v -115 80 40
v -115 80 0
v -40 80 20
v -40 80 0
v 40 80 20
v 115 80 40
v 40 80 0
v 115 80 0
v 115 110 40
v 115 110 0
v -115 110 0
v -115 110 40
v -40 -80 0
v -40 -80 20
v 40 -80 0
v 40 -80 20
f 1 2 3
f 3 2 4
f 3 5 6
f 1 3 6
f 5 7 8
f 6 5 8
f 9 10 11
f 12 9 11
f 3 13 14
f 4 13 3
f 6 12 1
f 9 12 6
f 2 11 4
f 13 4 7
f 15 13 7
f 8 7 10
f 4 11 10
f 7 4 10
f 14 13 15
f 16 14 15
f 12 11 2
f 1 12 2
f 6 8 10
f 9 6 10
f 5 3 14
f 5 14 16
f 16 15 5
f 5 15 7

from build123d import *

# Parameters (mm, degrees)
SKETCH1_W           = 80
SKETCH1_H           = 160
BOSS_EXTRUDE1_DEPTH = 20
BOSS_EXTRUDE2_DEPTH = 40


with BuildPart() as part:
    # Sketch1 → Boss-Extrude1 (new body)
    with BuildSketch(Plane.XY):
        Rectangle(SKETCH1_W, SKETCH1_H)
    extrude(amount=BOSS_EXTRUDE1_DEPTH)

    # Sketch1<3> → Boss-Extrude2 (add)
    with BuildSketch(Plane.XY):
        Polygon((-115, 80), (-40, 80), (40, 80), (115, 80), (115, 110), (-115, 110), align=None)
    extrude(amount=BOSS_EXTRUDE2_DEPTH)


solid = part.part
